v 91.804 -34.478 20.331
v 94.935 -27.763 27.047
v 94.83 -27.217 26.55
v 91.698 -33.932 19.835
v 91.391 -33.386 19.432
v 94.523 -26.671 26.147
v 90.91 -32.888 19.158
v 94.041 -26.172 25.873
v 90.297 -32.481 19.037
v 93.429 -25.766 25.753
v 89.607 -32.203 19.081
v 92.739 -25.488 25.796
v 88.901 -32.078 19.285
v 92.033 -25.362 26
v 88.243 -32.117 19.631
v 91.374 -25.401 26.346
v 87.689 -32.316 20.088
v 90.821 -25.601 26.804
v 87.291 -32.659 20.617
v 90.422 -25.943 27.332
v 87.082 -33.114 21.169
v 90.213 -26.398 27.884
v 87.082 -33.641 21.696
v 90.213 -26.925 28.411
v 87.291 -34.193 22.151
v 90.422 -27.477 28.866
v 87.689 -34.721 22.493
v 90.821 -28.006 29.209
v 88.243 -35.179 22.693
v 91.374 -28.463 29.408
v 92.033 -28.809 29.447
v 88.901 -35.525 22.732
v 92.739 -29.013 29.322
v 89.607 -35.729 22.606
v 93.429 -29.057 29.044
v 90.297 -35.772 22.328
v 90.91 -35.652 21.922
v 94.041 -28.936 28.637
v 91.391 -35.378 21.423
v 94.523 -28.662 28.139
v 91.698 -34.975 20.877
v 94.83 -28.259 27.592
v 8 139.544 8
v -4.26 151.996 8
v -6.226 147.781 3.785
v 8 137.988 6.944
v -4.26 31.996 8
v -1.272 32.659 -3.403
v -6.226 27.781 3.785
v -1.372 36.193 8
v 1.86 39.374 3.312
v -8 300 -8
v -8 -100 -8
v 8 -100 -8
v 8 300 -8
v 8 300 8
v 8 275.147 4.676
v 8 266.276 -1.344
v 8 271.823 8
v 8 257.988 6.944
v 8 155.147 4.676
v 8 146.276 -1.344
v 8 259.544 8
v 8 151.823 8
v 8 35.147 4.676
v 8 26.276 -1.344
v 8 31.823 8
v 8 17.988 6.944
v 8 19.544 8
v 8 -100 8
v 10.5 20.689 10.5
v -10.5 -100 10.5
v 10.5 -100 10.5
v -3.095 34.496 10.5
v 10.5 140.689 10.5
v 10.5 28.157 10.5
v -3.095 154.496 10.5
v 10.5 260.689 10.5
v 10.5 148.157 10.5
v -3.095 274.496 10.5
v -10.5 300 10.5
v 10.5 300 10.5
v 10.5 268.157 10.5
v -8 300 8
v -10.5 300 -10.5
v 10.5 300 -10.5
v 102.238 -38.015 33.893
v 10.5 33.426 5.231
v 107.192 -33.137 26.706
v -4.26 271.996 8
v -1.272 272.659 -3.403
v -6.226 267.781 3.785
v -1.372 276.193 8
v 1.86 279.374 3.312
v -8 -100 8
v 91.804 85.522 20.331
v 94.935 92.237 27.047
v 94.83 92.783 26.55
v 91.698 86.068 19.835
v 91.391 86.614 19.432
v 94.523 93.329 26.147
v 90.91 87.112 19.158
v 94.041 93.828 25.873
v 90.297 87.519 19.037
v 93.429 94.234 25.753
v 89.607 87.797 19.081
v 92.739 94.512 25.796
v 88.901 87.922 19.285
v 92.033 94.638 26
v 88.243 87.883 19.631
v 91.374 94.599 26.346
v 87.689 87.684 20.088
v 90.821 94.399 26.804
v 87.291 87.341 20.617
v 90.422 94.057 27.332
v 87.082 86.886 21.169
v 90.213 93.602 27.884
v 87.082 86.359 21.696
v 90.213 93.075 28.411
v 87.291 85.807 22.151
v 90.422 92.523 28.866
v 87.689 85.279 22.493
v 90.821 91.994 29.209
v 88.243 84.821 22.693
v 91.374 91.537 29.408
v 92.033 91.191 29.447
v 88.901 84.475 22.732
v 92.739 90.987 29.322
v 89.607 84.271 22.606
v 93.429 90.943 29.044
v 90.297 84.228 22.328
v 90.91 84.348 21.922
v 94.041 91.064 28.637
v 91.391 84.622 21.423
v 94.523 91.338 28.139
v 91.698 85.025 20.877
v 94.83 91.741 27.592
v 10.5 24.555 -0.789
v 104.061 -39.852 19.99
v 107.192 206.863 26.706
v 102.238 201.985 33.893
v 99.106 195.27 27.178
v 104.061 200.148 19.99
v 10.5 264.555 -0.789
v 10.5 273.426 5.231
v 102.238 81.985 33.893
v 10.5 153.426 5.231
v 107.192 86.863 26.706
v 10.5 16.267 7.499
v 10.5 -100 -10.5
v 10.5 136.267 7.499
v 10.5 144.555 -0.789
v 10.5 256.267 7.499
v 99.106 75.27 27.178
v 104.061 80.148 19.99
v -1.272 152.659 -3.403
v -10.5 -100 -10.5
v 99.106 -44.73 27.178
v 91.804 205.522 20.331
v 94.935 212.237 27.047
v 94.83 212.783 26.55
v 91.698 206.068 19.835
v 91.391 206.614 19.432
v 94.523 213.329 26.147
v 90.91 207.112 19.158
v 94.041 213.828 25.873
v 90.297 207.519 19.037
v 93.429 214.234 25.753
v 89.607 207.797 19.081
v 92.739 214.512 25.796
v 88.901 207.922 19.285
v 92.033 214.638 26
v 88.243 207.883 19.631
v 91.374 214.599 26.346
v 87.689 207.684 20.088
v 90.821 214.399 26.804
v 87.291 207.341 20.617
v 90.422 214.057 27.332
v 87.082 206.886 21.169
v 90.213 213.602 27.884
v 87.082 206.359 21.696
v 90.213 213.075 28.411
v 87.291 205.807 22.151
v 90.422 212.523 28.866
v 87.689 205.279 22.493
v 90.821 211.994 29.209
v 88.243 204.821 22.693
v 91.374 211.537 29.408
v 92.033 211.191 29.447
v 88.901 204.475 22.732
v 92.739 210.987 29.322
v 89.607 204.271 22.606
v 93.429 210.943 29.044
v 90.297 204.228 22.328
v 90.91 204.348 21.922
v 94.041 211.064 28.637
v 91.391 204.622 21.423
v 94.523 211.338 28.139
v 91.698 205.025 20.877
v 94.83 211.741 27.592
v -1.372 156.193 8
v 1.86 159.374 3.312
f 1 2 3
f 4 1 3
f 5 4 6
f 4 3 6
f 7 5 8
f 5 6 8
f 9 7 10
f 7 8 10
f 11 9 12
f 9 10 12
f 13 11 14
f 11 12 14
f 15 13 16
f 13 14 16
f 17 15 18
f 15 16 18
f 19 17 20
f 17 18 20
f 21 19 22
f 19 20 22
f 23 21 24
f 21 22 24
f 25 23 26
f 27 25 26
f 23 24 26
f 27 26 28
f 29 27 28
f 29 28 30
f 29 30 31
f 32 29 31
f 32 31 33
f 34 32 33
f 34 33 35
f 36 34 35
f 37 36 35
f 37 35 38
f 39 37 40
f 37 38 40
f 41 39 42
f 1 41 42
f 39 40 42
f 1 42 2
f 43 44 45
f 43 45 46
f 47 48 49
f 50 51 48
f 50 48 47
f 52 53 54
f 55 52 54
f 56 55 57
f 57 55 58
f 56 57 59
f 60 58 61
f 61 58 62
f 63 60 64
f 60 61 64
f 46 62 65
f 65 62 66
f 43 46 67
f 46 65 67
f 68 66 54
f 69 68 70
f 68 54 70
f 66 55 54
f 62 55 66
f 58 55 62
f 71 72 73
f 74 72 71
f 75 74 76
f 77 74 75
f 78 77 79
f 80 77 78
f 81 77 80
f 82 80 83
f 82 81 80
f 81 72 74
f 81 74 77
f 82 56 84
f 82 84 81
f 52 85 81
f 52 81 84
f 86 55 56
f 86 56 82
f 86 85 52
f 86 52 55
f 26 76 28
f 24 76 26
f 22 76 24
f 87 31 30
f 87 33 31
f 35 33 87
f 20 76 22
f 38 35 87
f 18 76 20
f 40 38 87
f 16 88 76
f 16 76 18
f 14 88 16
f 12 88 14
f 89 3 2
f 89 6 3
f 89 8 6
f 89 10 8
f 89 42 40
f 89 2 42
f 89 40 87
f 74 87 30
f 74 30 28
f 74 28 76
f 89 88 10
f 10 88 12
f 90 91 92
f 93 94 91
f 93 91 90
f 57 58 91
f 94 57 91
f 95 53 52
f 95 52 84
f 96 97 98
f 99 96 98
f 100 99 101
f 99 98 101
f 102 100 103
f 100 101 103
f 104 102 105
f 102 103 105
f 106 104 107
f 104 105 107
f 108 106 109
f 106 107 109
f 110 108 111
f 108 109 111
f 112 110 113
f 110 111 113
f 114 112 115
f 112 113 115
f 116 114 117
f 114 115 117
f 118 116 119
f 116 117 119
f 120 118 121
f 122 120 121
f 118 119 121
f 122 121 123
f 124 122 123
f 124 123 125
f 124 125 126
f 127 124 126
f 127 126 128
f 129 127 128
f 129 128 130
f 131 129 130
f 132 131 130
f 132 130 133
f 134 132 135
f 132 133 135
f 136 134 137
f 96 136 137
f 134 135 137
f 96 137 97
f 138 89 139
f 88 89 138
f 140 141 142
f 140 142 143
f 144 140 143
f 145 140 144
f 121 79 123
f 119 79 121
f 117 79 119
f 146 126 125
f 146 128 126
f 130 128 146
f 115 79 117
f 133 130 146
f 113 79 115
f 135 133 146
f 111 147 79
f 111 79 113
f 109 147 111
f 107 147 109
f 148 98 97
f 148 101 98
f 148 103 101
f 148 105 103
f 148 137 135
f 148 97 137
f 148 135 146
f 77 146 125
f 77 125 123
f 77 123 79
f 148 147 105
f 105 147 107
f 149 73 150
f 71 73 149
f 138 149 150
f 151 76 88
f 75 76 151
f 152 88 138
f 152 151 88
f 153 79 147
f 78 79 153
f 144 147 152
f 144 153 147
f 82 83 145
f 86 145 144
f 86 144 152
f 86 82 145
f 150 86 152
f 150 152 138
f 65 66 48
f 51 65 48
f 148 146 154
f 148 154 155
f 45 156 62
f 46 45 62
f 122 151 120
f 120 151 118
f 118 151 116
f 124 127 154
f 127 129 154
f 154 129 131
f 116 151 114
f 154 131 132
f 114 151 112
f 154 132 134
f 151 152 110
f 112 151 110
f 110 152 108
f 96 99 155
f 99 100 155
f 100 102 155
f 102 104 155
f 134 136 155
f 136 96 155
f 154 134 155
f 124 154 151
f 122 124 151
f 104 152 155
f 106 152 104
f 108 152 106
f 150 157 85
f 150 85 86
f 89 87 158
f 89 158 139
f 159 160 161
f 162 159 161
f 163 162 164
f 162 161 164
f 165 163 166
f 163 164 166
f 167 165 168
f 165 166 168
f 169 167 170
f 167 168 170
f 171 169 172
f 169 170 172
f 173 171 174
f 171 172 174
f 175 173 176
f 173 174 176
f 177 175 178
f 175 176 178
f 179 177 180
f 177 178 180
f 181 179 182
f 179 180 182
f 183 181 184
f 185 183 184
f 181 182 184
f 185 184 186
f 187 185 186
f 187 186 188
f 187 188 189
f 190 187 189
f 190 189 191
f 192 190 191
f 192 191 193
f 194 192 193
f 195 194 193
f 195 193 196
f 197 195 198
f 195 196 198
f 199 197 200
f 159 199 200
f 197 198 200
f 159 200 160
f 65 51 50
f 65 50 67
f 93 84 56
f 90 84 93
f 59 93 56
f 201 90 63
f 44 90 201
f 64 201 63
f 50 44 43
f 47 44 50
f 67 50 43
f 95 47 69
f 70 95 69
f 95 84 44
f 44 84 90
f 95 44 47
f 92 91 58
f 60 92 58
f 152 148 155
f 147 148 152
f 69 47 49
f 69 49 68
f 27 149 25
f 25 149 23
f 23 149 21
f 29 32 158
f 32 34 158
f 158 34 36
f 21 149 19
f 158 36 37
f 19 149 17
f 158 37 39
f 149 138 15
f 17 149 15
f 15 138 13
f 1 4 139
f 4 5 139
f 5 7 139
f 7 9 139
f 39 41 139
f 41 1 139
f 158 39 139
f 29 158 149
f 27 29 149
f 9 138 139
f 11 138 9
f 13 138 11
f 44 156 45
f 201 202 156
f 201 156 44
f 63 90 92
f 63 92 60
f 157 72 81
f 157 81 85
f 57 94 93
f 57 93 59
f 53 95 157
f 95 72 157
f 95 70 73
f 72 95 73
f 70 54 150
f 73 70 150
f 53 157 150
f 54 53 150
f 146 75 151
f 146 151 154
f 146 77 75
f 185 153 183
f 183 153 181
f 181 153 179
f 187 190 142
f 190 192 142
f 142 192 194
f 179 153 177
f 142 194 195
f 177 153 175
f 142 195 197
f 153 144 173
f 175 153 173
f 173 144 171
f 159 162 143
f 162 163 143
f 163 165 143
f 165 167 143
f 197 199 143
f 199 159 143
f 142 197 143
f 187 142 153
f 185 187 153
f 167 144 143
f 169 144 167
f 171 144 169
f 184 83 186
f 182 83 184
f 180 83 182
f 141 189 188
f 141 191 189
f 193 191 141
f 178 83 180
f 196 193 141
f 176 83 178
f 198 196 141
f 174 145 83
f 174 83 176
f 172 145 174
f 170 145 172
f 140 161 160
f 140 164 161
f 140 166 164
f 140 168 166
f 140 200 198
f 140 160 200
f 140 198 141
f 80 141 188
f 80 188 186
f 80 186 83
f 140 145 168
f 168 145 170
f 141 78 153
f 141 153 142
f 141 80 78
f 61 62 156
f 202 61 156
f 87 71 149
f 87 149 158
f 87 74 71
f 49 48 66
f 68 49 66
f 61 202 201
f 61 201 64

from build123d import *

# Parameters (mm, degrees)
SKETCH2_W                = 21
SKETCH2_H                = 21
BOSS_EXTRUDE1_DEPTH      = 300
BOSS_EXTRUDE1_DEPTH_BACK = 100
SKETCH3_W                = 16
SKETCH3_H                = 16
CUT_EXTRUDE1_DEPTH       = 800
SKETCH14_R               = 2.5
BOSS_EXTRUDE3_DEPTH      = 10
LPATTERN1_COUNT          = 3
LPATTERN1_PITCH          = 120


with BuildPart() as part:
    # Sketch2 → Boss-Extrude1 (new body, two sides)
    with BuildSketch(Plane(origin=(0, 0, 0), x_dir=(1, 0, 0), z_dir=(0, 1, 0))) as boss_extrude1_sk:
        Rectangle(SKETCH2_W, SKETCH2_H)
    extrude(amount=BOSS_EXTRUDE1_DEPTH)
    extrude(boss_extrude1_sk.sketch, amount=-BOSS_EXTRUDE1_DEPTH_BACK)

    # Sketch3 → Cut-Extrude1 (cut)
    with BuildSketch(Plane.XZ.offset(100)):
        Rectangle(SKETCH3_W, SKETCH3_H)
    extrude(amount=-CUT_EXTRUDE1_DEPTH, mode=Mode.SUBTRACT)

    # Sketch14 → Boss-Extrude3 (add)
    with BuildSketch(Plane(origin=(9.15884387, 19.641204062, 19.641204062), x_dir=(0.949705125, -0.221427386, -0.221427386), z_dir=(0.313145613, 0.671542934, 0.671542934))):
        Polygon((-12.902384486, 16.967939861), (98.008310235, -50.846644091), (103.224816692, -42.31505219), (-7.685878028, 25.499531762), align=None)
        with Locations((87.819175611, -38.756088454)):
            Circle(SKETCH14_R, mode=Mode.SUBTRACT)
    boss_extrude3 = extrude(amount=-BOSS_EXTRUDE3_DEPTH)

    # LPattern1: Boss-Extrude3 ×3
    with Locations(*[(0, i * LPATTERN1_PITCH, 0) for i in range(1, LPATTERN1_COUNT)]):
        add(boss_extrude3)


solid = part.part
